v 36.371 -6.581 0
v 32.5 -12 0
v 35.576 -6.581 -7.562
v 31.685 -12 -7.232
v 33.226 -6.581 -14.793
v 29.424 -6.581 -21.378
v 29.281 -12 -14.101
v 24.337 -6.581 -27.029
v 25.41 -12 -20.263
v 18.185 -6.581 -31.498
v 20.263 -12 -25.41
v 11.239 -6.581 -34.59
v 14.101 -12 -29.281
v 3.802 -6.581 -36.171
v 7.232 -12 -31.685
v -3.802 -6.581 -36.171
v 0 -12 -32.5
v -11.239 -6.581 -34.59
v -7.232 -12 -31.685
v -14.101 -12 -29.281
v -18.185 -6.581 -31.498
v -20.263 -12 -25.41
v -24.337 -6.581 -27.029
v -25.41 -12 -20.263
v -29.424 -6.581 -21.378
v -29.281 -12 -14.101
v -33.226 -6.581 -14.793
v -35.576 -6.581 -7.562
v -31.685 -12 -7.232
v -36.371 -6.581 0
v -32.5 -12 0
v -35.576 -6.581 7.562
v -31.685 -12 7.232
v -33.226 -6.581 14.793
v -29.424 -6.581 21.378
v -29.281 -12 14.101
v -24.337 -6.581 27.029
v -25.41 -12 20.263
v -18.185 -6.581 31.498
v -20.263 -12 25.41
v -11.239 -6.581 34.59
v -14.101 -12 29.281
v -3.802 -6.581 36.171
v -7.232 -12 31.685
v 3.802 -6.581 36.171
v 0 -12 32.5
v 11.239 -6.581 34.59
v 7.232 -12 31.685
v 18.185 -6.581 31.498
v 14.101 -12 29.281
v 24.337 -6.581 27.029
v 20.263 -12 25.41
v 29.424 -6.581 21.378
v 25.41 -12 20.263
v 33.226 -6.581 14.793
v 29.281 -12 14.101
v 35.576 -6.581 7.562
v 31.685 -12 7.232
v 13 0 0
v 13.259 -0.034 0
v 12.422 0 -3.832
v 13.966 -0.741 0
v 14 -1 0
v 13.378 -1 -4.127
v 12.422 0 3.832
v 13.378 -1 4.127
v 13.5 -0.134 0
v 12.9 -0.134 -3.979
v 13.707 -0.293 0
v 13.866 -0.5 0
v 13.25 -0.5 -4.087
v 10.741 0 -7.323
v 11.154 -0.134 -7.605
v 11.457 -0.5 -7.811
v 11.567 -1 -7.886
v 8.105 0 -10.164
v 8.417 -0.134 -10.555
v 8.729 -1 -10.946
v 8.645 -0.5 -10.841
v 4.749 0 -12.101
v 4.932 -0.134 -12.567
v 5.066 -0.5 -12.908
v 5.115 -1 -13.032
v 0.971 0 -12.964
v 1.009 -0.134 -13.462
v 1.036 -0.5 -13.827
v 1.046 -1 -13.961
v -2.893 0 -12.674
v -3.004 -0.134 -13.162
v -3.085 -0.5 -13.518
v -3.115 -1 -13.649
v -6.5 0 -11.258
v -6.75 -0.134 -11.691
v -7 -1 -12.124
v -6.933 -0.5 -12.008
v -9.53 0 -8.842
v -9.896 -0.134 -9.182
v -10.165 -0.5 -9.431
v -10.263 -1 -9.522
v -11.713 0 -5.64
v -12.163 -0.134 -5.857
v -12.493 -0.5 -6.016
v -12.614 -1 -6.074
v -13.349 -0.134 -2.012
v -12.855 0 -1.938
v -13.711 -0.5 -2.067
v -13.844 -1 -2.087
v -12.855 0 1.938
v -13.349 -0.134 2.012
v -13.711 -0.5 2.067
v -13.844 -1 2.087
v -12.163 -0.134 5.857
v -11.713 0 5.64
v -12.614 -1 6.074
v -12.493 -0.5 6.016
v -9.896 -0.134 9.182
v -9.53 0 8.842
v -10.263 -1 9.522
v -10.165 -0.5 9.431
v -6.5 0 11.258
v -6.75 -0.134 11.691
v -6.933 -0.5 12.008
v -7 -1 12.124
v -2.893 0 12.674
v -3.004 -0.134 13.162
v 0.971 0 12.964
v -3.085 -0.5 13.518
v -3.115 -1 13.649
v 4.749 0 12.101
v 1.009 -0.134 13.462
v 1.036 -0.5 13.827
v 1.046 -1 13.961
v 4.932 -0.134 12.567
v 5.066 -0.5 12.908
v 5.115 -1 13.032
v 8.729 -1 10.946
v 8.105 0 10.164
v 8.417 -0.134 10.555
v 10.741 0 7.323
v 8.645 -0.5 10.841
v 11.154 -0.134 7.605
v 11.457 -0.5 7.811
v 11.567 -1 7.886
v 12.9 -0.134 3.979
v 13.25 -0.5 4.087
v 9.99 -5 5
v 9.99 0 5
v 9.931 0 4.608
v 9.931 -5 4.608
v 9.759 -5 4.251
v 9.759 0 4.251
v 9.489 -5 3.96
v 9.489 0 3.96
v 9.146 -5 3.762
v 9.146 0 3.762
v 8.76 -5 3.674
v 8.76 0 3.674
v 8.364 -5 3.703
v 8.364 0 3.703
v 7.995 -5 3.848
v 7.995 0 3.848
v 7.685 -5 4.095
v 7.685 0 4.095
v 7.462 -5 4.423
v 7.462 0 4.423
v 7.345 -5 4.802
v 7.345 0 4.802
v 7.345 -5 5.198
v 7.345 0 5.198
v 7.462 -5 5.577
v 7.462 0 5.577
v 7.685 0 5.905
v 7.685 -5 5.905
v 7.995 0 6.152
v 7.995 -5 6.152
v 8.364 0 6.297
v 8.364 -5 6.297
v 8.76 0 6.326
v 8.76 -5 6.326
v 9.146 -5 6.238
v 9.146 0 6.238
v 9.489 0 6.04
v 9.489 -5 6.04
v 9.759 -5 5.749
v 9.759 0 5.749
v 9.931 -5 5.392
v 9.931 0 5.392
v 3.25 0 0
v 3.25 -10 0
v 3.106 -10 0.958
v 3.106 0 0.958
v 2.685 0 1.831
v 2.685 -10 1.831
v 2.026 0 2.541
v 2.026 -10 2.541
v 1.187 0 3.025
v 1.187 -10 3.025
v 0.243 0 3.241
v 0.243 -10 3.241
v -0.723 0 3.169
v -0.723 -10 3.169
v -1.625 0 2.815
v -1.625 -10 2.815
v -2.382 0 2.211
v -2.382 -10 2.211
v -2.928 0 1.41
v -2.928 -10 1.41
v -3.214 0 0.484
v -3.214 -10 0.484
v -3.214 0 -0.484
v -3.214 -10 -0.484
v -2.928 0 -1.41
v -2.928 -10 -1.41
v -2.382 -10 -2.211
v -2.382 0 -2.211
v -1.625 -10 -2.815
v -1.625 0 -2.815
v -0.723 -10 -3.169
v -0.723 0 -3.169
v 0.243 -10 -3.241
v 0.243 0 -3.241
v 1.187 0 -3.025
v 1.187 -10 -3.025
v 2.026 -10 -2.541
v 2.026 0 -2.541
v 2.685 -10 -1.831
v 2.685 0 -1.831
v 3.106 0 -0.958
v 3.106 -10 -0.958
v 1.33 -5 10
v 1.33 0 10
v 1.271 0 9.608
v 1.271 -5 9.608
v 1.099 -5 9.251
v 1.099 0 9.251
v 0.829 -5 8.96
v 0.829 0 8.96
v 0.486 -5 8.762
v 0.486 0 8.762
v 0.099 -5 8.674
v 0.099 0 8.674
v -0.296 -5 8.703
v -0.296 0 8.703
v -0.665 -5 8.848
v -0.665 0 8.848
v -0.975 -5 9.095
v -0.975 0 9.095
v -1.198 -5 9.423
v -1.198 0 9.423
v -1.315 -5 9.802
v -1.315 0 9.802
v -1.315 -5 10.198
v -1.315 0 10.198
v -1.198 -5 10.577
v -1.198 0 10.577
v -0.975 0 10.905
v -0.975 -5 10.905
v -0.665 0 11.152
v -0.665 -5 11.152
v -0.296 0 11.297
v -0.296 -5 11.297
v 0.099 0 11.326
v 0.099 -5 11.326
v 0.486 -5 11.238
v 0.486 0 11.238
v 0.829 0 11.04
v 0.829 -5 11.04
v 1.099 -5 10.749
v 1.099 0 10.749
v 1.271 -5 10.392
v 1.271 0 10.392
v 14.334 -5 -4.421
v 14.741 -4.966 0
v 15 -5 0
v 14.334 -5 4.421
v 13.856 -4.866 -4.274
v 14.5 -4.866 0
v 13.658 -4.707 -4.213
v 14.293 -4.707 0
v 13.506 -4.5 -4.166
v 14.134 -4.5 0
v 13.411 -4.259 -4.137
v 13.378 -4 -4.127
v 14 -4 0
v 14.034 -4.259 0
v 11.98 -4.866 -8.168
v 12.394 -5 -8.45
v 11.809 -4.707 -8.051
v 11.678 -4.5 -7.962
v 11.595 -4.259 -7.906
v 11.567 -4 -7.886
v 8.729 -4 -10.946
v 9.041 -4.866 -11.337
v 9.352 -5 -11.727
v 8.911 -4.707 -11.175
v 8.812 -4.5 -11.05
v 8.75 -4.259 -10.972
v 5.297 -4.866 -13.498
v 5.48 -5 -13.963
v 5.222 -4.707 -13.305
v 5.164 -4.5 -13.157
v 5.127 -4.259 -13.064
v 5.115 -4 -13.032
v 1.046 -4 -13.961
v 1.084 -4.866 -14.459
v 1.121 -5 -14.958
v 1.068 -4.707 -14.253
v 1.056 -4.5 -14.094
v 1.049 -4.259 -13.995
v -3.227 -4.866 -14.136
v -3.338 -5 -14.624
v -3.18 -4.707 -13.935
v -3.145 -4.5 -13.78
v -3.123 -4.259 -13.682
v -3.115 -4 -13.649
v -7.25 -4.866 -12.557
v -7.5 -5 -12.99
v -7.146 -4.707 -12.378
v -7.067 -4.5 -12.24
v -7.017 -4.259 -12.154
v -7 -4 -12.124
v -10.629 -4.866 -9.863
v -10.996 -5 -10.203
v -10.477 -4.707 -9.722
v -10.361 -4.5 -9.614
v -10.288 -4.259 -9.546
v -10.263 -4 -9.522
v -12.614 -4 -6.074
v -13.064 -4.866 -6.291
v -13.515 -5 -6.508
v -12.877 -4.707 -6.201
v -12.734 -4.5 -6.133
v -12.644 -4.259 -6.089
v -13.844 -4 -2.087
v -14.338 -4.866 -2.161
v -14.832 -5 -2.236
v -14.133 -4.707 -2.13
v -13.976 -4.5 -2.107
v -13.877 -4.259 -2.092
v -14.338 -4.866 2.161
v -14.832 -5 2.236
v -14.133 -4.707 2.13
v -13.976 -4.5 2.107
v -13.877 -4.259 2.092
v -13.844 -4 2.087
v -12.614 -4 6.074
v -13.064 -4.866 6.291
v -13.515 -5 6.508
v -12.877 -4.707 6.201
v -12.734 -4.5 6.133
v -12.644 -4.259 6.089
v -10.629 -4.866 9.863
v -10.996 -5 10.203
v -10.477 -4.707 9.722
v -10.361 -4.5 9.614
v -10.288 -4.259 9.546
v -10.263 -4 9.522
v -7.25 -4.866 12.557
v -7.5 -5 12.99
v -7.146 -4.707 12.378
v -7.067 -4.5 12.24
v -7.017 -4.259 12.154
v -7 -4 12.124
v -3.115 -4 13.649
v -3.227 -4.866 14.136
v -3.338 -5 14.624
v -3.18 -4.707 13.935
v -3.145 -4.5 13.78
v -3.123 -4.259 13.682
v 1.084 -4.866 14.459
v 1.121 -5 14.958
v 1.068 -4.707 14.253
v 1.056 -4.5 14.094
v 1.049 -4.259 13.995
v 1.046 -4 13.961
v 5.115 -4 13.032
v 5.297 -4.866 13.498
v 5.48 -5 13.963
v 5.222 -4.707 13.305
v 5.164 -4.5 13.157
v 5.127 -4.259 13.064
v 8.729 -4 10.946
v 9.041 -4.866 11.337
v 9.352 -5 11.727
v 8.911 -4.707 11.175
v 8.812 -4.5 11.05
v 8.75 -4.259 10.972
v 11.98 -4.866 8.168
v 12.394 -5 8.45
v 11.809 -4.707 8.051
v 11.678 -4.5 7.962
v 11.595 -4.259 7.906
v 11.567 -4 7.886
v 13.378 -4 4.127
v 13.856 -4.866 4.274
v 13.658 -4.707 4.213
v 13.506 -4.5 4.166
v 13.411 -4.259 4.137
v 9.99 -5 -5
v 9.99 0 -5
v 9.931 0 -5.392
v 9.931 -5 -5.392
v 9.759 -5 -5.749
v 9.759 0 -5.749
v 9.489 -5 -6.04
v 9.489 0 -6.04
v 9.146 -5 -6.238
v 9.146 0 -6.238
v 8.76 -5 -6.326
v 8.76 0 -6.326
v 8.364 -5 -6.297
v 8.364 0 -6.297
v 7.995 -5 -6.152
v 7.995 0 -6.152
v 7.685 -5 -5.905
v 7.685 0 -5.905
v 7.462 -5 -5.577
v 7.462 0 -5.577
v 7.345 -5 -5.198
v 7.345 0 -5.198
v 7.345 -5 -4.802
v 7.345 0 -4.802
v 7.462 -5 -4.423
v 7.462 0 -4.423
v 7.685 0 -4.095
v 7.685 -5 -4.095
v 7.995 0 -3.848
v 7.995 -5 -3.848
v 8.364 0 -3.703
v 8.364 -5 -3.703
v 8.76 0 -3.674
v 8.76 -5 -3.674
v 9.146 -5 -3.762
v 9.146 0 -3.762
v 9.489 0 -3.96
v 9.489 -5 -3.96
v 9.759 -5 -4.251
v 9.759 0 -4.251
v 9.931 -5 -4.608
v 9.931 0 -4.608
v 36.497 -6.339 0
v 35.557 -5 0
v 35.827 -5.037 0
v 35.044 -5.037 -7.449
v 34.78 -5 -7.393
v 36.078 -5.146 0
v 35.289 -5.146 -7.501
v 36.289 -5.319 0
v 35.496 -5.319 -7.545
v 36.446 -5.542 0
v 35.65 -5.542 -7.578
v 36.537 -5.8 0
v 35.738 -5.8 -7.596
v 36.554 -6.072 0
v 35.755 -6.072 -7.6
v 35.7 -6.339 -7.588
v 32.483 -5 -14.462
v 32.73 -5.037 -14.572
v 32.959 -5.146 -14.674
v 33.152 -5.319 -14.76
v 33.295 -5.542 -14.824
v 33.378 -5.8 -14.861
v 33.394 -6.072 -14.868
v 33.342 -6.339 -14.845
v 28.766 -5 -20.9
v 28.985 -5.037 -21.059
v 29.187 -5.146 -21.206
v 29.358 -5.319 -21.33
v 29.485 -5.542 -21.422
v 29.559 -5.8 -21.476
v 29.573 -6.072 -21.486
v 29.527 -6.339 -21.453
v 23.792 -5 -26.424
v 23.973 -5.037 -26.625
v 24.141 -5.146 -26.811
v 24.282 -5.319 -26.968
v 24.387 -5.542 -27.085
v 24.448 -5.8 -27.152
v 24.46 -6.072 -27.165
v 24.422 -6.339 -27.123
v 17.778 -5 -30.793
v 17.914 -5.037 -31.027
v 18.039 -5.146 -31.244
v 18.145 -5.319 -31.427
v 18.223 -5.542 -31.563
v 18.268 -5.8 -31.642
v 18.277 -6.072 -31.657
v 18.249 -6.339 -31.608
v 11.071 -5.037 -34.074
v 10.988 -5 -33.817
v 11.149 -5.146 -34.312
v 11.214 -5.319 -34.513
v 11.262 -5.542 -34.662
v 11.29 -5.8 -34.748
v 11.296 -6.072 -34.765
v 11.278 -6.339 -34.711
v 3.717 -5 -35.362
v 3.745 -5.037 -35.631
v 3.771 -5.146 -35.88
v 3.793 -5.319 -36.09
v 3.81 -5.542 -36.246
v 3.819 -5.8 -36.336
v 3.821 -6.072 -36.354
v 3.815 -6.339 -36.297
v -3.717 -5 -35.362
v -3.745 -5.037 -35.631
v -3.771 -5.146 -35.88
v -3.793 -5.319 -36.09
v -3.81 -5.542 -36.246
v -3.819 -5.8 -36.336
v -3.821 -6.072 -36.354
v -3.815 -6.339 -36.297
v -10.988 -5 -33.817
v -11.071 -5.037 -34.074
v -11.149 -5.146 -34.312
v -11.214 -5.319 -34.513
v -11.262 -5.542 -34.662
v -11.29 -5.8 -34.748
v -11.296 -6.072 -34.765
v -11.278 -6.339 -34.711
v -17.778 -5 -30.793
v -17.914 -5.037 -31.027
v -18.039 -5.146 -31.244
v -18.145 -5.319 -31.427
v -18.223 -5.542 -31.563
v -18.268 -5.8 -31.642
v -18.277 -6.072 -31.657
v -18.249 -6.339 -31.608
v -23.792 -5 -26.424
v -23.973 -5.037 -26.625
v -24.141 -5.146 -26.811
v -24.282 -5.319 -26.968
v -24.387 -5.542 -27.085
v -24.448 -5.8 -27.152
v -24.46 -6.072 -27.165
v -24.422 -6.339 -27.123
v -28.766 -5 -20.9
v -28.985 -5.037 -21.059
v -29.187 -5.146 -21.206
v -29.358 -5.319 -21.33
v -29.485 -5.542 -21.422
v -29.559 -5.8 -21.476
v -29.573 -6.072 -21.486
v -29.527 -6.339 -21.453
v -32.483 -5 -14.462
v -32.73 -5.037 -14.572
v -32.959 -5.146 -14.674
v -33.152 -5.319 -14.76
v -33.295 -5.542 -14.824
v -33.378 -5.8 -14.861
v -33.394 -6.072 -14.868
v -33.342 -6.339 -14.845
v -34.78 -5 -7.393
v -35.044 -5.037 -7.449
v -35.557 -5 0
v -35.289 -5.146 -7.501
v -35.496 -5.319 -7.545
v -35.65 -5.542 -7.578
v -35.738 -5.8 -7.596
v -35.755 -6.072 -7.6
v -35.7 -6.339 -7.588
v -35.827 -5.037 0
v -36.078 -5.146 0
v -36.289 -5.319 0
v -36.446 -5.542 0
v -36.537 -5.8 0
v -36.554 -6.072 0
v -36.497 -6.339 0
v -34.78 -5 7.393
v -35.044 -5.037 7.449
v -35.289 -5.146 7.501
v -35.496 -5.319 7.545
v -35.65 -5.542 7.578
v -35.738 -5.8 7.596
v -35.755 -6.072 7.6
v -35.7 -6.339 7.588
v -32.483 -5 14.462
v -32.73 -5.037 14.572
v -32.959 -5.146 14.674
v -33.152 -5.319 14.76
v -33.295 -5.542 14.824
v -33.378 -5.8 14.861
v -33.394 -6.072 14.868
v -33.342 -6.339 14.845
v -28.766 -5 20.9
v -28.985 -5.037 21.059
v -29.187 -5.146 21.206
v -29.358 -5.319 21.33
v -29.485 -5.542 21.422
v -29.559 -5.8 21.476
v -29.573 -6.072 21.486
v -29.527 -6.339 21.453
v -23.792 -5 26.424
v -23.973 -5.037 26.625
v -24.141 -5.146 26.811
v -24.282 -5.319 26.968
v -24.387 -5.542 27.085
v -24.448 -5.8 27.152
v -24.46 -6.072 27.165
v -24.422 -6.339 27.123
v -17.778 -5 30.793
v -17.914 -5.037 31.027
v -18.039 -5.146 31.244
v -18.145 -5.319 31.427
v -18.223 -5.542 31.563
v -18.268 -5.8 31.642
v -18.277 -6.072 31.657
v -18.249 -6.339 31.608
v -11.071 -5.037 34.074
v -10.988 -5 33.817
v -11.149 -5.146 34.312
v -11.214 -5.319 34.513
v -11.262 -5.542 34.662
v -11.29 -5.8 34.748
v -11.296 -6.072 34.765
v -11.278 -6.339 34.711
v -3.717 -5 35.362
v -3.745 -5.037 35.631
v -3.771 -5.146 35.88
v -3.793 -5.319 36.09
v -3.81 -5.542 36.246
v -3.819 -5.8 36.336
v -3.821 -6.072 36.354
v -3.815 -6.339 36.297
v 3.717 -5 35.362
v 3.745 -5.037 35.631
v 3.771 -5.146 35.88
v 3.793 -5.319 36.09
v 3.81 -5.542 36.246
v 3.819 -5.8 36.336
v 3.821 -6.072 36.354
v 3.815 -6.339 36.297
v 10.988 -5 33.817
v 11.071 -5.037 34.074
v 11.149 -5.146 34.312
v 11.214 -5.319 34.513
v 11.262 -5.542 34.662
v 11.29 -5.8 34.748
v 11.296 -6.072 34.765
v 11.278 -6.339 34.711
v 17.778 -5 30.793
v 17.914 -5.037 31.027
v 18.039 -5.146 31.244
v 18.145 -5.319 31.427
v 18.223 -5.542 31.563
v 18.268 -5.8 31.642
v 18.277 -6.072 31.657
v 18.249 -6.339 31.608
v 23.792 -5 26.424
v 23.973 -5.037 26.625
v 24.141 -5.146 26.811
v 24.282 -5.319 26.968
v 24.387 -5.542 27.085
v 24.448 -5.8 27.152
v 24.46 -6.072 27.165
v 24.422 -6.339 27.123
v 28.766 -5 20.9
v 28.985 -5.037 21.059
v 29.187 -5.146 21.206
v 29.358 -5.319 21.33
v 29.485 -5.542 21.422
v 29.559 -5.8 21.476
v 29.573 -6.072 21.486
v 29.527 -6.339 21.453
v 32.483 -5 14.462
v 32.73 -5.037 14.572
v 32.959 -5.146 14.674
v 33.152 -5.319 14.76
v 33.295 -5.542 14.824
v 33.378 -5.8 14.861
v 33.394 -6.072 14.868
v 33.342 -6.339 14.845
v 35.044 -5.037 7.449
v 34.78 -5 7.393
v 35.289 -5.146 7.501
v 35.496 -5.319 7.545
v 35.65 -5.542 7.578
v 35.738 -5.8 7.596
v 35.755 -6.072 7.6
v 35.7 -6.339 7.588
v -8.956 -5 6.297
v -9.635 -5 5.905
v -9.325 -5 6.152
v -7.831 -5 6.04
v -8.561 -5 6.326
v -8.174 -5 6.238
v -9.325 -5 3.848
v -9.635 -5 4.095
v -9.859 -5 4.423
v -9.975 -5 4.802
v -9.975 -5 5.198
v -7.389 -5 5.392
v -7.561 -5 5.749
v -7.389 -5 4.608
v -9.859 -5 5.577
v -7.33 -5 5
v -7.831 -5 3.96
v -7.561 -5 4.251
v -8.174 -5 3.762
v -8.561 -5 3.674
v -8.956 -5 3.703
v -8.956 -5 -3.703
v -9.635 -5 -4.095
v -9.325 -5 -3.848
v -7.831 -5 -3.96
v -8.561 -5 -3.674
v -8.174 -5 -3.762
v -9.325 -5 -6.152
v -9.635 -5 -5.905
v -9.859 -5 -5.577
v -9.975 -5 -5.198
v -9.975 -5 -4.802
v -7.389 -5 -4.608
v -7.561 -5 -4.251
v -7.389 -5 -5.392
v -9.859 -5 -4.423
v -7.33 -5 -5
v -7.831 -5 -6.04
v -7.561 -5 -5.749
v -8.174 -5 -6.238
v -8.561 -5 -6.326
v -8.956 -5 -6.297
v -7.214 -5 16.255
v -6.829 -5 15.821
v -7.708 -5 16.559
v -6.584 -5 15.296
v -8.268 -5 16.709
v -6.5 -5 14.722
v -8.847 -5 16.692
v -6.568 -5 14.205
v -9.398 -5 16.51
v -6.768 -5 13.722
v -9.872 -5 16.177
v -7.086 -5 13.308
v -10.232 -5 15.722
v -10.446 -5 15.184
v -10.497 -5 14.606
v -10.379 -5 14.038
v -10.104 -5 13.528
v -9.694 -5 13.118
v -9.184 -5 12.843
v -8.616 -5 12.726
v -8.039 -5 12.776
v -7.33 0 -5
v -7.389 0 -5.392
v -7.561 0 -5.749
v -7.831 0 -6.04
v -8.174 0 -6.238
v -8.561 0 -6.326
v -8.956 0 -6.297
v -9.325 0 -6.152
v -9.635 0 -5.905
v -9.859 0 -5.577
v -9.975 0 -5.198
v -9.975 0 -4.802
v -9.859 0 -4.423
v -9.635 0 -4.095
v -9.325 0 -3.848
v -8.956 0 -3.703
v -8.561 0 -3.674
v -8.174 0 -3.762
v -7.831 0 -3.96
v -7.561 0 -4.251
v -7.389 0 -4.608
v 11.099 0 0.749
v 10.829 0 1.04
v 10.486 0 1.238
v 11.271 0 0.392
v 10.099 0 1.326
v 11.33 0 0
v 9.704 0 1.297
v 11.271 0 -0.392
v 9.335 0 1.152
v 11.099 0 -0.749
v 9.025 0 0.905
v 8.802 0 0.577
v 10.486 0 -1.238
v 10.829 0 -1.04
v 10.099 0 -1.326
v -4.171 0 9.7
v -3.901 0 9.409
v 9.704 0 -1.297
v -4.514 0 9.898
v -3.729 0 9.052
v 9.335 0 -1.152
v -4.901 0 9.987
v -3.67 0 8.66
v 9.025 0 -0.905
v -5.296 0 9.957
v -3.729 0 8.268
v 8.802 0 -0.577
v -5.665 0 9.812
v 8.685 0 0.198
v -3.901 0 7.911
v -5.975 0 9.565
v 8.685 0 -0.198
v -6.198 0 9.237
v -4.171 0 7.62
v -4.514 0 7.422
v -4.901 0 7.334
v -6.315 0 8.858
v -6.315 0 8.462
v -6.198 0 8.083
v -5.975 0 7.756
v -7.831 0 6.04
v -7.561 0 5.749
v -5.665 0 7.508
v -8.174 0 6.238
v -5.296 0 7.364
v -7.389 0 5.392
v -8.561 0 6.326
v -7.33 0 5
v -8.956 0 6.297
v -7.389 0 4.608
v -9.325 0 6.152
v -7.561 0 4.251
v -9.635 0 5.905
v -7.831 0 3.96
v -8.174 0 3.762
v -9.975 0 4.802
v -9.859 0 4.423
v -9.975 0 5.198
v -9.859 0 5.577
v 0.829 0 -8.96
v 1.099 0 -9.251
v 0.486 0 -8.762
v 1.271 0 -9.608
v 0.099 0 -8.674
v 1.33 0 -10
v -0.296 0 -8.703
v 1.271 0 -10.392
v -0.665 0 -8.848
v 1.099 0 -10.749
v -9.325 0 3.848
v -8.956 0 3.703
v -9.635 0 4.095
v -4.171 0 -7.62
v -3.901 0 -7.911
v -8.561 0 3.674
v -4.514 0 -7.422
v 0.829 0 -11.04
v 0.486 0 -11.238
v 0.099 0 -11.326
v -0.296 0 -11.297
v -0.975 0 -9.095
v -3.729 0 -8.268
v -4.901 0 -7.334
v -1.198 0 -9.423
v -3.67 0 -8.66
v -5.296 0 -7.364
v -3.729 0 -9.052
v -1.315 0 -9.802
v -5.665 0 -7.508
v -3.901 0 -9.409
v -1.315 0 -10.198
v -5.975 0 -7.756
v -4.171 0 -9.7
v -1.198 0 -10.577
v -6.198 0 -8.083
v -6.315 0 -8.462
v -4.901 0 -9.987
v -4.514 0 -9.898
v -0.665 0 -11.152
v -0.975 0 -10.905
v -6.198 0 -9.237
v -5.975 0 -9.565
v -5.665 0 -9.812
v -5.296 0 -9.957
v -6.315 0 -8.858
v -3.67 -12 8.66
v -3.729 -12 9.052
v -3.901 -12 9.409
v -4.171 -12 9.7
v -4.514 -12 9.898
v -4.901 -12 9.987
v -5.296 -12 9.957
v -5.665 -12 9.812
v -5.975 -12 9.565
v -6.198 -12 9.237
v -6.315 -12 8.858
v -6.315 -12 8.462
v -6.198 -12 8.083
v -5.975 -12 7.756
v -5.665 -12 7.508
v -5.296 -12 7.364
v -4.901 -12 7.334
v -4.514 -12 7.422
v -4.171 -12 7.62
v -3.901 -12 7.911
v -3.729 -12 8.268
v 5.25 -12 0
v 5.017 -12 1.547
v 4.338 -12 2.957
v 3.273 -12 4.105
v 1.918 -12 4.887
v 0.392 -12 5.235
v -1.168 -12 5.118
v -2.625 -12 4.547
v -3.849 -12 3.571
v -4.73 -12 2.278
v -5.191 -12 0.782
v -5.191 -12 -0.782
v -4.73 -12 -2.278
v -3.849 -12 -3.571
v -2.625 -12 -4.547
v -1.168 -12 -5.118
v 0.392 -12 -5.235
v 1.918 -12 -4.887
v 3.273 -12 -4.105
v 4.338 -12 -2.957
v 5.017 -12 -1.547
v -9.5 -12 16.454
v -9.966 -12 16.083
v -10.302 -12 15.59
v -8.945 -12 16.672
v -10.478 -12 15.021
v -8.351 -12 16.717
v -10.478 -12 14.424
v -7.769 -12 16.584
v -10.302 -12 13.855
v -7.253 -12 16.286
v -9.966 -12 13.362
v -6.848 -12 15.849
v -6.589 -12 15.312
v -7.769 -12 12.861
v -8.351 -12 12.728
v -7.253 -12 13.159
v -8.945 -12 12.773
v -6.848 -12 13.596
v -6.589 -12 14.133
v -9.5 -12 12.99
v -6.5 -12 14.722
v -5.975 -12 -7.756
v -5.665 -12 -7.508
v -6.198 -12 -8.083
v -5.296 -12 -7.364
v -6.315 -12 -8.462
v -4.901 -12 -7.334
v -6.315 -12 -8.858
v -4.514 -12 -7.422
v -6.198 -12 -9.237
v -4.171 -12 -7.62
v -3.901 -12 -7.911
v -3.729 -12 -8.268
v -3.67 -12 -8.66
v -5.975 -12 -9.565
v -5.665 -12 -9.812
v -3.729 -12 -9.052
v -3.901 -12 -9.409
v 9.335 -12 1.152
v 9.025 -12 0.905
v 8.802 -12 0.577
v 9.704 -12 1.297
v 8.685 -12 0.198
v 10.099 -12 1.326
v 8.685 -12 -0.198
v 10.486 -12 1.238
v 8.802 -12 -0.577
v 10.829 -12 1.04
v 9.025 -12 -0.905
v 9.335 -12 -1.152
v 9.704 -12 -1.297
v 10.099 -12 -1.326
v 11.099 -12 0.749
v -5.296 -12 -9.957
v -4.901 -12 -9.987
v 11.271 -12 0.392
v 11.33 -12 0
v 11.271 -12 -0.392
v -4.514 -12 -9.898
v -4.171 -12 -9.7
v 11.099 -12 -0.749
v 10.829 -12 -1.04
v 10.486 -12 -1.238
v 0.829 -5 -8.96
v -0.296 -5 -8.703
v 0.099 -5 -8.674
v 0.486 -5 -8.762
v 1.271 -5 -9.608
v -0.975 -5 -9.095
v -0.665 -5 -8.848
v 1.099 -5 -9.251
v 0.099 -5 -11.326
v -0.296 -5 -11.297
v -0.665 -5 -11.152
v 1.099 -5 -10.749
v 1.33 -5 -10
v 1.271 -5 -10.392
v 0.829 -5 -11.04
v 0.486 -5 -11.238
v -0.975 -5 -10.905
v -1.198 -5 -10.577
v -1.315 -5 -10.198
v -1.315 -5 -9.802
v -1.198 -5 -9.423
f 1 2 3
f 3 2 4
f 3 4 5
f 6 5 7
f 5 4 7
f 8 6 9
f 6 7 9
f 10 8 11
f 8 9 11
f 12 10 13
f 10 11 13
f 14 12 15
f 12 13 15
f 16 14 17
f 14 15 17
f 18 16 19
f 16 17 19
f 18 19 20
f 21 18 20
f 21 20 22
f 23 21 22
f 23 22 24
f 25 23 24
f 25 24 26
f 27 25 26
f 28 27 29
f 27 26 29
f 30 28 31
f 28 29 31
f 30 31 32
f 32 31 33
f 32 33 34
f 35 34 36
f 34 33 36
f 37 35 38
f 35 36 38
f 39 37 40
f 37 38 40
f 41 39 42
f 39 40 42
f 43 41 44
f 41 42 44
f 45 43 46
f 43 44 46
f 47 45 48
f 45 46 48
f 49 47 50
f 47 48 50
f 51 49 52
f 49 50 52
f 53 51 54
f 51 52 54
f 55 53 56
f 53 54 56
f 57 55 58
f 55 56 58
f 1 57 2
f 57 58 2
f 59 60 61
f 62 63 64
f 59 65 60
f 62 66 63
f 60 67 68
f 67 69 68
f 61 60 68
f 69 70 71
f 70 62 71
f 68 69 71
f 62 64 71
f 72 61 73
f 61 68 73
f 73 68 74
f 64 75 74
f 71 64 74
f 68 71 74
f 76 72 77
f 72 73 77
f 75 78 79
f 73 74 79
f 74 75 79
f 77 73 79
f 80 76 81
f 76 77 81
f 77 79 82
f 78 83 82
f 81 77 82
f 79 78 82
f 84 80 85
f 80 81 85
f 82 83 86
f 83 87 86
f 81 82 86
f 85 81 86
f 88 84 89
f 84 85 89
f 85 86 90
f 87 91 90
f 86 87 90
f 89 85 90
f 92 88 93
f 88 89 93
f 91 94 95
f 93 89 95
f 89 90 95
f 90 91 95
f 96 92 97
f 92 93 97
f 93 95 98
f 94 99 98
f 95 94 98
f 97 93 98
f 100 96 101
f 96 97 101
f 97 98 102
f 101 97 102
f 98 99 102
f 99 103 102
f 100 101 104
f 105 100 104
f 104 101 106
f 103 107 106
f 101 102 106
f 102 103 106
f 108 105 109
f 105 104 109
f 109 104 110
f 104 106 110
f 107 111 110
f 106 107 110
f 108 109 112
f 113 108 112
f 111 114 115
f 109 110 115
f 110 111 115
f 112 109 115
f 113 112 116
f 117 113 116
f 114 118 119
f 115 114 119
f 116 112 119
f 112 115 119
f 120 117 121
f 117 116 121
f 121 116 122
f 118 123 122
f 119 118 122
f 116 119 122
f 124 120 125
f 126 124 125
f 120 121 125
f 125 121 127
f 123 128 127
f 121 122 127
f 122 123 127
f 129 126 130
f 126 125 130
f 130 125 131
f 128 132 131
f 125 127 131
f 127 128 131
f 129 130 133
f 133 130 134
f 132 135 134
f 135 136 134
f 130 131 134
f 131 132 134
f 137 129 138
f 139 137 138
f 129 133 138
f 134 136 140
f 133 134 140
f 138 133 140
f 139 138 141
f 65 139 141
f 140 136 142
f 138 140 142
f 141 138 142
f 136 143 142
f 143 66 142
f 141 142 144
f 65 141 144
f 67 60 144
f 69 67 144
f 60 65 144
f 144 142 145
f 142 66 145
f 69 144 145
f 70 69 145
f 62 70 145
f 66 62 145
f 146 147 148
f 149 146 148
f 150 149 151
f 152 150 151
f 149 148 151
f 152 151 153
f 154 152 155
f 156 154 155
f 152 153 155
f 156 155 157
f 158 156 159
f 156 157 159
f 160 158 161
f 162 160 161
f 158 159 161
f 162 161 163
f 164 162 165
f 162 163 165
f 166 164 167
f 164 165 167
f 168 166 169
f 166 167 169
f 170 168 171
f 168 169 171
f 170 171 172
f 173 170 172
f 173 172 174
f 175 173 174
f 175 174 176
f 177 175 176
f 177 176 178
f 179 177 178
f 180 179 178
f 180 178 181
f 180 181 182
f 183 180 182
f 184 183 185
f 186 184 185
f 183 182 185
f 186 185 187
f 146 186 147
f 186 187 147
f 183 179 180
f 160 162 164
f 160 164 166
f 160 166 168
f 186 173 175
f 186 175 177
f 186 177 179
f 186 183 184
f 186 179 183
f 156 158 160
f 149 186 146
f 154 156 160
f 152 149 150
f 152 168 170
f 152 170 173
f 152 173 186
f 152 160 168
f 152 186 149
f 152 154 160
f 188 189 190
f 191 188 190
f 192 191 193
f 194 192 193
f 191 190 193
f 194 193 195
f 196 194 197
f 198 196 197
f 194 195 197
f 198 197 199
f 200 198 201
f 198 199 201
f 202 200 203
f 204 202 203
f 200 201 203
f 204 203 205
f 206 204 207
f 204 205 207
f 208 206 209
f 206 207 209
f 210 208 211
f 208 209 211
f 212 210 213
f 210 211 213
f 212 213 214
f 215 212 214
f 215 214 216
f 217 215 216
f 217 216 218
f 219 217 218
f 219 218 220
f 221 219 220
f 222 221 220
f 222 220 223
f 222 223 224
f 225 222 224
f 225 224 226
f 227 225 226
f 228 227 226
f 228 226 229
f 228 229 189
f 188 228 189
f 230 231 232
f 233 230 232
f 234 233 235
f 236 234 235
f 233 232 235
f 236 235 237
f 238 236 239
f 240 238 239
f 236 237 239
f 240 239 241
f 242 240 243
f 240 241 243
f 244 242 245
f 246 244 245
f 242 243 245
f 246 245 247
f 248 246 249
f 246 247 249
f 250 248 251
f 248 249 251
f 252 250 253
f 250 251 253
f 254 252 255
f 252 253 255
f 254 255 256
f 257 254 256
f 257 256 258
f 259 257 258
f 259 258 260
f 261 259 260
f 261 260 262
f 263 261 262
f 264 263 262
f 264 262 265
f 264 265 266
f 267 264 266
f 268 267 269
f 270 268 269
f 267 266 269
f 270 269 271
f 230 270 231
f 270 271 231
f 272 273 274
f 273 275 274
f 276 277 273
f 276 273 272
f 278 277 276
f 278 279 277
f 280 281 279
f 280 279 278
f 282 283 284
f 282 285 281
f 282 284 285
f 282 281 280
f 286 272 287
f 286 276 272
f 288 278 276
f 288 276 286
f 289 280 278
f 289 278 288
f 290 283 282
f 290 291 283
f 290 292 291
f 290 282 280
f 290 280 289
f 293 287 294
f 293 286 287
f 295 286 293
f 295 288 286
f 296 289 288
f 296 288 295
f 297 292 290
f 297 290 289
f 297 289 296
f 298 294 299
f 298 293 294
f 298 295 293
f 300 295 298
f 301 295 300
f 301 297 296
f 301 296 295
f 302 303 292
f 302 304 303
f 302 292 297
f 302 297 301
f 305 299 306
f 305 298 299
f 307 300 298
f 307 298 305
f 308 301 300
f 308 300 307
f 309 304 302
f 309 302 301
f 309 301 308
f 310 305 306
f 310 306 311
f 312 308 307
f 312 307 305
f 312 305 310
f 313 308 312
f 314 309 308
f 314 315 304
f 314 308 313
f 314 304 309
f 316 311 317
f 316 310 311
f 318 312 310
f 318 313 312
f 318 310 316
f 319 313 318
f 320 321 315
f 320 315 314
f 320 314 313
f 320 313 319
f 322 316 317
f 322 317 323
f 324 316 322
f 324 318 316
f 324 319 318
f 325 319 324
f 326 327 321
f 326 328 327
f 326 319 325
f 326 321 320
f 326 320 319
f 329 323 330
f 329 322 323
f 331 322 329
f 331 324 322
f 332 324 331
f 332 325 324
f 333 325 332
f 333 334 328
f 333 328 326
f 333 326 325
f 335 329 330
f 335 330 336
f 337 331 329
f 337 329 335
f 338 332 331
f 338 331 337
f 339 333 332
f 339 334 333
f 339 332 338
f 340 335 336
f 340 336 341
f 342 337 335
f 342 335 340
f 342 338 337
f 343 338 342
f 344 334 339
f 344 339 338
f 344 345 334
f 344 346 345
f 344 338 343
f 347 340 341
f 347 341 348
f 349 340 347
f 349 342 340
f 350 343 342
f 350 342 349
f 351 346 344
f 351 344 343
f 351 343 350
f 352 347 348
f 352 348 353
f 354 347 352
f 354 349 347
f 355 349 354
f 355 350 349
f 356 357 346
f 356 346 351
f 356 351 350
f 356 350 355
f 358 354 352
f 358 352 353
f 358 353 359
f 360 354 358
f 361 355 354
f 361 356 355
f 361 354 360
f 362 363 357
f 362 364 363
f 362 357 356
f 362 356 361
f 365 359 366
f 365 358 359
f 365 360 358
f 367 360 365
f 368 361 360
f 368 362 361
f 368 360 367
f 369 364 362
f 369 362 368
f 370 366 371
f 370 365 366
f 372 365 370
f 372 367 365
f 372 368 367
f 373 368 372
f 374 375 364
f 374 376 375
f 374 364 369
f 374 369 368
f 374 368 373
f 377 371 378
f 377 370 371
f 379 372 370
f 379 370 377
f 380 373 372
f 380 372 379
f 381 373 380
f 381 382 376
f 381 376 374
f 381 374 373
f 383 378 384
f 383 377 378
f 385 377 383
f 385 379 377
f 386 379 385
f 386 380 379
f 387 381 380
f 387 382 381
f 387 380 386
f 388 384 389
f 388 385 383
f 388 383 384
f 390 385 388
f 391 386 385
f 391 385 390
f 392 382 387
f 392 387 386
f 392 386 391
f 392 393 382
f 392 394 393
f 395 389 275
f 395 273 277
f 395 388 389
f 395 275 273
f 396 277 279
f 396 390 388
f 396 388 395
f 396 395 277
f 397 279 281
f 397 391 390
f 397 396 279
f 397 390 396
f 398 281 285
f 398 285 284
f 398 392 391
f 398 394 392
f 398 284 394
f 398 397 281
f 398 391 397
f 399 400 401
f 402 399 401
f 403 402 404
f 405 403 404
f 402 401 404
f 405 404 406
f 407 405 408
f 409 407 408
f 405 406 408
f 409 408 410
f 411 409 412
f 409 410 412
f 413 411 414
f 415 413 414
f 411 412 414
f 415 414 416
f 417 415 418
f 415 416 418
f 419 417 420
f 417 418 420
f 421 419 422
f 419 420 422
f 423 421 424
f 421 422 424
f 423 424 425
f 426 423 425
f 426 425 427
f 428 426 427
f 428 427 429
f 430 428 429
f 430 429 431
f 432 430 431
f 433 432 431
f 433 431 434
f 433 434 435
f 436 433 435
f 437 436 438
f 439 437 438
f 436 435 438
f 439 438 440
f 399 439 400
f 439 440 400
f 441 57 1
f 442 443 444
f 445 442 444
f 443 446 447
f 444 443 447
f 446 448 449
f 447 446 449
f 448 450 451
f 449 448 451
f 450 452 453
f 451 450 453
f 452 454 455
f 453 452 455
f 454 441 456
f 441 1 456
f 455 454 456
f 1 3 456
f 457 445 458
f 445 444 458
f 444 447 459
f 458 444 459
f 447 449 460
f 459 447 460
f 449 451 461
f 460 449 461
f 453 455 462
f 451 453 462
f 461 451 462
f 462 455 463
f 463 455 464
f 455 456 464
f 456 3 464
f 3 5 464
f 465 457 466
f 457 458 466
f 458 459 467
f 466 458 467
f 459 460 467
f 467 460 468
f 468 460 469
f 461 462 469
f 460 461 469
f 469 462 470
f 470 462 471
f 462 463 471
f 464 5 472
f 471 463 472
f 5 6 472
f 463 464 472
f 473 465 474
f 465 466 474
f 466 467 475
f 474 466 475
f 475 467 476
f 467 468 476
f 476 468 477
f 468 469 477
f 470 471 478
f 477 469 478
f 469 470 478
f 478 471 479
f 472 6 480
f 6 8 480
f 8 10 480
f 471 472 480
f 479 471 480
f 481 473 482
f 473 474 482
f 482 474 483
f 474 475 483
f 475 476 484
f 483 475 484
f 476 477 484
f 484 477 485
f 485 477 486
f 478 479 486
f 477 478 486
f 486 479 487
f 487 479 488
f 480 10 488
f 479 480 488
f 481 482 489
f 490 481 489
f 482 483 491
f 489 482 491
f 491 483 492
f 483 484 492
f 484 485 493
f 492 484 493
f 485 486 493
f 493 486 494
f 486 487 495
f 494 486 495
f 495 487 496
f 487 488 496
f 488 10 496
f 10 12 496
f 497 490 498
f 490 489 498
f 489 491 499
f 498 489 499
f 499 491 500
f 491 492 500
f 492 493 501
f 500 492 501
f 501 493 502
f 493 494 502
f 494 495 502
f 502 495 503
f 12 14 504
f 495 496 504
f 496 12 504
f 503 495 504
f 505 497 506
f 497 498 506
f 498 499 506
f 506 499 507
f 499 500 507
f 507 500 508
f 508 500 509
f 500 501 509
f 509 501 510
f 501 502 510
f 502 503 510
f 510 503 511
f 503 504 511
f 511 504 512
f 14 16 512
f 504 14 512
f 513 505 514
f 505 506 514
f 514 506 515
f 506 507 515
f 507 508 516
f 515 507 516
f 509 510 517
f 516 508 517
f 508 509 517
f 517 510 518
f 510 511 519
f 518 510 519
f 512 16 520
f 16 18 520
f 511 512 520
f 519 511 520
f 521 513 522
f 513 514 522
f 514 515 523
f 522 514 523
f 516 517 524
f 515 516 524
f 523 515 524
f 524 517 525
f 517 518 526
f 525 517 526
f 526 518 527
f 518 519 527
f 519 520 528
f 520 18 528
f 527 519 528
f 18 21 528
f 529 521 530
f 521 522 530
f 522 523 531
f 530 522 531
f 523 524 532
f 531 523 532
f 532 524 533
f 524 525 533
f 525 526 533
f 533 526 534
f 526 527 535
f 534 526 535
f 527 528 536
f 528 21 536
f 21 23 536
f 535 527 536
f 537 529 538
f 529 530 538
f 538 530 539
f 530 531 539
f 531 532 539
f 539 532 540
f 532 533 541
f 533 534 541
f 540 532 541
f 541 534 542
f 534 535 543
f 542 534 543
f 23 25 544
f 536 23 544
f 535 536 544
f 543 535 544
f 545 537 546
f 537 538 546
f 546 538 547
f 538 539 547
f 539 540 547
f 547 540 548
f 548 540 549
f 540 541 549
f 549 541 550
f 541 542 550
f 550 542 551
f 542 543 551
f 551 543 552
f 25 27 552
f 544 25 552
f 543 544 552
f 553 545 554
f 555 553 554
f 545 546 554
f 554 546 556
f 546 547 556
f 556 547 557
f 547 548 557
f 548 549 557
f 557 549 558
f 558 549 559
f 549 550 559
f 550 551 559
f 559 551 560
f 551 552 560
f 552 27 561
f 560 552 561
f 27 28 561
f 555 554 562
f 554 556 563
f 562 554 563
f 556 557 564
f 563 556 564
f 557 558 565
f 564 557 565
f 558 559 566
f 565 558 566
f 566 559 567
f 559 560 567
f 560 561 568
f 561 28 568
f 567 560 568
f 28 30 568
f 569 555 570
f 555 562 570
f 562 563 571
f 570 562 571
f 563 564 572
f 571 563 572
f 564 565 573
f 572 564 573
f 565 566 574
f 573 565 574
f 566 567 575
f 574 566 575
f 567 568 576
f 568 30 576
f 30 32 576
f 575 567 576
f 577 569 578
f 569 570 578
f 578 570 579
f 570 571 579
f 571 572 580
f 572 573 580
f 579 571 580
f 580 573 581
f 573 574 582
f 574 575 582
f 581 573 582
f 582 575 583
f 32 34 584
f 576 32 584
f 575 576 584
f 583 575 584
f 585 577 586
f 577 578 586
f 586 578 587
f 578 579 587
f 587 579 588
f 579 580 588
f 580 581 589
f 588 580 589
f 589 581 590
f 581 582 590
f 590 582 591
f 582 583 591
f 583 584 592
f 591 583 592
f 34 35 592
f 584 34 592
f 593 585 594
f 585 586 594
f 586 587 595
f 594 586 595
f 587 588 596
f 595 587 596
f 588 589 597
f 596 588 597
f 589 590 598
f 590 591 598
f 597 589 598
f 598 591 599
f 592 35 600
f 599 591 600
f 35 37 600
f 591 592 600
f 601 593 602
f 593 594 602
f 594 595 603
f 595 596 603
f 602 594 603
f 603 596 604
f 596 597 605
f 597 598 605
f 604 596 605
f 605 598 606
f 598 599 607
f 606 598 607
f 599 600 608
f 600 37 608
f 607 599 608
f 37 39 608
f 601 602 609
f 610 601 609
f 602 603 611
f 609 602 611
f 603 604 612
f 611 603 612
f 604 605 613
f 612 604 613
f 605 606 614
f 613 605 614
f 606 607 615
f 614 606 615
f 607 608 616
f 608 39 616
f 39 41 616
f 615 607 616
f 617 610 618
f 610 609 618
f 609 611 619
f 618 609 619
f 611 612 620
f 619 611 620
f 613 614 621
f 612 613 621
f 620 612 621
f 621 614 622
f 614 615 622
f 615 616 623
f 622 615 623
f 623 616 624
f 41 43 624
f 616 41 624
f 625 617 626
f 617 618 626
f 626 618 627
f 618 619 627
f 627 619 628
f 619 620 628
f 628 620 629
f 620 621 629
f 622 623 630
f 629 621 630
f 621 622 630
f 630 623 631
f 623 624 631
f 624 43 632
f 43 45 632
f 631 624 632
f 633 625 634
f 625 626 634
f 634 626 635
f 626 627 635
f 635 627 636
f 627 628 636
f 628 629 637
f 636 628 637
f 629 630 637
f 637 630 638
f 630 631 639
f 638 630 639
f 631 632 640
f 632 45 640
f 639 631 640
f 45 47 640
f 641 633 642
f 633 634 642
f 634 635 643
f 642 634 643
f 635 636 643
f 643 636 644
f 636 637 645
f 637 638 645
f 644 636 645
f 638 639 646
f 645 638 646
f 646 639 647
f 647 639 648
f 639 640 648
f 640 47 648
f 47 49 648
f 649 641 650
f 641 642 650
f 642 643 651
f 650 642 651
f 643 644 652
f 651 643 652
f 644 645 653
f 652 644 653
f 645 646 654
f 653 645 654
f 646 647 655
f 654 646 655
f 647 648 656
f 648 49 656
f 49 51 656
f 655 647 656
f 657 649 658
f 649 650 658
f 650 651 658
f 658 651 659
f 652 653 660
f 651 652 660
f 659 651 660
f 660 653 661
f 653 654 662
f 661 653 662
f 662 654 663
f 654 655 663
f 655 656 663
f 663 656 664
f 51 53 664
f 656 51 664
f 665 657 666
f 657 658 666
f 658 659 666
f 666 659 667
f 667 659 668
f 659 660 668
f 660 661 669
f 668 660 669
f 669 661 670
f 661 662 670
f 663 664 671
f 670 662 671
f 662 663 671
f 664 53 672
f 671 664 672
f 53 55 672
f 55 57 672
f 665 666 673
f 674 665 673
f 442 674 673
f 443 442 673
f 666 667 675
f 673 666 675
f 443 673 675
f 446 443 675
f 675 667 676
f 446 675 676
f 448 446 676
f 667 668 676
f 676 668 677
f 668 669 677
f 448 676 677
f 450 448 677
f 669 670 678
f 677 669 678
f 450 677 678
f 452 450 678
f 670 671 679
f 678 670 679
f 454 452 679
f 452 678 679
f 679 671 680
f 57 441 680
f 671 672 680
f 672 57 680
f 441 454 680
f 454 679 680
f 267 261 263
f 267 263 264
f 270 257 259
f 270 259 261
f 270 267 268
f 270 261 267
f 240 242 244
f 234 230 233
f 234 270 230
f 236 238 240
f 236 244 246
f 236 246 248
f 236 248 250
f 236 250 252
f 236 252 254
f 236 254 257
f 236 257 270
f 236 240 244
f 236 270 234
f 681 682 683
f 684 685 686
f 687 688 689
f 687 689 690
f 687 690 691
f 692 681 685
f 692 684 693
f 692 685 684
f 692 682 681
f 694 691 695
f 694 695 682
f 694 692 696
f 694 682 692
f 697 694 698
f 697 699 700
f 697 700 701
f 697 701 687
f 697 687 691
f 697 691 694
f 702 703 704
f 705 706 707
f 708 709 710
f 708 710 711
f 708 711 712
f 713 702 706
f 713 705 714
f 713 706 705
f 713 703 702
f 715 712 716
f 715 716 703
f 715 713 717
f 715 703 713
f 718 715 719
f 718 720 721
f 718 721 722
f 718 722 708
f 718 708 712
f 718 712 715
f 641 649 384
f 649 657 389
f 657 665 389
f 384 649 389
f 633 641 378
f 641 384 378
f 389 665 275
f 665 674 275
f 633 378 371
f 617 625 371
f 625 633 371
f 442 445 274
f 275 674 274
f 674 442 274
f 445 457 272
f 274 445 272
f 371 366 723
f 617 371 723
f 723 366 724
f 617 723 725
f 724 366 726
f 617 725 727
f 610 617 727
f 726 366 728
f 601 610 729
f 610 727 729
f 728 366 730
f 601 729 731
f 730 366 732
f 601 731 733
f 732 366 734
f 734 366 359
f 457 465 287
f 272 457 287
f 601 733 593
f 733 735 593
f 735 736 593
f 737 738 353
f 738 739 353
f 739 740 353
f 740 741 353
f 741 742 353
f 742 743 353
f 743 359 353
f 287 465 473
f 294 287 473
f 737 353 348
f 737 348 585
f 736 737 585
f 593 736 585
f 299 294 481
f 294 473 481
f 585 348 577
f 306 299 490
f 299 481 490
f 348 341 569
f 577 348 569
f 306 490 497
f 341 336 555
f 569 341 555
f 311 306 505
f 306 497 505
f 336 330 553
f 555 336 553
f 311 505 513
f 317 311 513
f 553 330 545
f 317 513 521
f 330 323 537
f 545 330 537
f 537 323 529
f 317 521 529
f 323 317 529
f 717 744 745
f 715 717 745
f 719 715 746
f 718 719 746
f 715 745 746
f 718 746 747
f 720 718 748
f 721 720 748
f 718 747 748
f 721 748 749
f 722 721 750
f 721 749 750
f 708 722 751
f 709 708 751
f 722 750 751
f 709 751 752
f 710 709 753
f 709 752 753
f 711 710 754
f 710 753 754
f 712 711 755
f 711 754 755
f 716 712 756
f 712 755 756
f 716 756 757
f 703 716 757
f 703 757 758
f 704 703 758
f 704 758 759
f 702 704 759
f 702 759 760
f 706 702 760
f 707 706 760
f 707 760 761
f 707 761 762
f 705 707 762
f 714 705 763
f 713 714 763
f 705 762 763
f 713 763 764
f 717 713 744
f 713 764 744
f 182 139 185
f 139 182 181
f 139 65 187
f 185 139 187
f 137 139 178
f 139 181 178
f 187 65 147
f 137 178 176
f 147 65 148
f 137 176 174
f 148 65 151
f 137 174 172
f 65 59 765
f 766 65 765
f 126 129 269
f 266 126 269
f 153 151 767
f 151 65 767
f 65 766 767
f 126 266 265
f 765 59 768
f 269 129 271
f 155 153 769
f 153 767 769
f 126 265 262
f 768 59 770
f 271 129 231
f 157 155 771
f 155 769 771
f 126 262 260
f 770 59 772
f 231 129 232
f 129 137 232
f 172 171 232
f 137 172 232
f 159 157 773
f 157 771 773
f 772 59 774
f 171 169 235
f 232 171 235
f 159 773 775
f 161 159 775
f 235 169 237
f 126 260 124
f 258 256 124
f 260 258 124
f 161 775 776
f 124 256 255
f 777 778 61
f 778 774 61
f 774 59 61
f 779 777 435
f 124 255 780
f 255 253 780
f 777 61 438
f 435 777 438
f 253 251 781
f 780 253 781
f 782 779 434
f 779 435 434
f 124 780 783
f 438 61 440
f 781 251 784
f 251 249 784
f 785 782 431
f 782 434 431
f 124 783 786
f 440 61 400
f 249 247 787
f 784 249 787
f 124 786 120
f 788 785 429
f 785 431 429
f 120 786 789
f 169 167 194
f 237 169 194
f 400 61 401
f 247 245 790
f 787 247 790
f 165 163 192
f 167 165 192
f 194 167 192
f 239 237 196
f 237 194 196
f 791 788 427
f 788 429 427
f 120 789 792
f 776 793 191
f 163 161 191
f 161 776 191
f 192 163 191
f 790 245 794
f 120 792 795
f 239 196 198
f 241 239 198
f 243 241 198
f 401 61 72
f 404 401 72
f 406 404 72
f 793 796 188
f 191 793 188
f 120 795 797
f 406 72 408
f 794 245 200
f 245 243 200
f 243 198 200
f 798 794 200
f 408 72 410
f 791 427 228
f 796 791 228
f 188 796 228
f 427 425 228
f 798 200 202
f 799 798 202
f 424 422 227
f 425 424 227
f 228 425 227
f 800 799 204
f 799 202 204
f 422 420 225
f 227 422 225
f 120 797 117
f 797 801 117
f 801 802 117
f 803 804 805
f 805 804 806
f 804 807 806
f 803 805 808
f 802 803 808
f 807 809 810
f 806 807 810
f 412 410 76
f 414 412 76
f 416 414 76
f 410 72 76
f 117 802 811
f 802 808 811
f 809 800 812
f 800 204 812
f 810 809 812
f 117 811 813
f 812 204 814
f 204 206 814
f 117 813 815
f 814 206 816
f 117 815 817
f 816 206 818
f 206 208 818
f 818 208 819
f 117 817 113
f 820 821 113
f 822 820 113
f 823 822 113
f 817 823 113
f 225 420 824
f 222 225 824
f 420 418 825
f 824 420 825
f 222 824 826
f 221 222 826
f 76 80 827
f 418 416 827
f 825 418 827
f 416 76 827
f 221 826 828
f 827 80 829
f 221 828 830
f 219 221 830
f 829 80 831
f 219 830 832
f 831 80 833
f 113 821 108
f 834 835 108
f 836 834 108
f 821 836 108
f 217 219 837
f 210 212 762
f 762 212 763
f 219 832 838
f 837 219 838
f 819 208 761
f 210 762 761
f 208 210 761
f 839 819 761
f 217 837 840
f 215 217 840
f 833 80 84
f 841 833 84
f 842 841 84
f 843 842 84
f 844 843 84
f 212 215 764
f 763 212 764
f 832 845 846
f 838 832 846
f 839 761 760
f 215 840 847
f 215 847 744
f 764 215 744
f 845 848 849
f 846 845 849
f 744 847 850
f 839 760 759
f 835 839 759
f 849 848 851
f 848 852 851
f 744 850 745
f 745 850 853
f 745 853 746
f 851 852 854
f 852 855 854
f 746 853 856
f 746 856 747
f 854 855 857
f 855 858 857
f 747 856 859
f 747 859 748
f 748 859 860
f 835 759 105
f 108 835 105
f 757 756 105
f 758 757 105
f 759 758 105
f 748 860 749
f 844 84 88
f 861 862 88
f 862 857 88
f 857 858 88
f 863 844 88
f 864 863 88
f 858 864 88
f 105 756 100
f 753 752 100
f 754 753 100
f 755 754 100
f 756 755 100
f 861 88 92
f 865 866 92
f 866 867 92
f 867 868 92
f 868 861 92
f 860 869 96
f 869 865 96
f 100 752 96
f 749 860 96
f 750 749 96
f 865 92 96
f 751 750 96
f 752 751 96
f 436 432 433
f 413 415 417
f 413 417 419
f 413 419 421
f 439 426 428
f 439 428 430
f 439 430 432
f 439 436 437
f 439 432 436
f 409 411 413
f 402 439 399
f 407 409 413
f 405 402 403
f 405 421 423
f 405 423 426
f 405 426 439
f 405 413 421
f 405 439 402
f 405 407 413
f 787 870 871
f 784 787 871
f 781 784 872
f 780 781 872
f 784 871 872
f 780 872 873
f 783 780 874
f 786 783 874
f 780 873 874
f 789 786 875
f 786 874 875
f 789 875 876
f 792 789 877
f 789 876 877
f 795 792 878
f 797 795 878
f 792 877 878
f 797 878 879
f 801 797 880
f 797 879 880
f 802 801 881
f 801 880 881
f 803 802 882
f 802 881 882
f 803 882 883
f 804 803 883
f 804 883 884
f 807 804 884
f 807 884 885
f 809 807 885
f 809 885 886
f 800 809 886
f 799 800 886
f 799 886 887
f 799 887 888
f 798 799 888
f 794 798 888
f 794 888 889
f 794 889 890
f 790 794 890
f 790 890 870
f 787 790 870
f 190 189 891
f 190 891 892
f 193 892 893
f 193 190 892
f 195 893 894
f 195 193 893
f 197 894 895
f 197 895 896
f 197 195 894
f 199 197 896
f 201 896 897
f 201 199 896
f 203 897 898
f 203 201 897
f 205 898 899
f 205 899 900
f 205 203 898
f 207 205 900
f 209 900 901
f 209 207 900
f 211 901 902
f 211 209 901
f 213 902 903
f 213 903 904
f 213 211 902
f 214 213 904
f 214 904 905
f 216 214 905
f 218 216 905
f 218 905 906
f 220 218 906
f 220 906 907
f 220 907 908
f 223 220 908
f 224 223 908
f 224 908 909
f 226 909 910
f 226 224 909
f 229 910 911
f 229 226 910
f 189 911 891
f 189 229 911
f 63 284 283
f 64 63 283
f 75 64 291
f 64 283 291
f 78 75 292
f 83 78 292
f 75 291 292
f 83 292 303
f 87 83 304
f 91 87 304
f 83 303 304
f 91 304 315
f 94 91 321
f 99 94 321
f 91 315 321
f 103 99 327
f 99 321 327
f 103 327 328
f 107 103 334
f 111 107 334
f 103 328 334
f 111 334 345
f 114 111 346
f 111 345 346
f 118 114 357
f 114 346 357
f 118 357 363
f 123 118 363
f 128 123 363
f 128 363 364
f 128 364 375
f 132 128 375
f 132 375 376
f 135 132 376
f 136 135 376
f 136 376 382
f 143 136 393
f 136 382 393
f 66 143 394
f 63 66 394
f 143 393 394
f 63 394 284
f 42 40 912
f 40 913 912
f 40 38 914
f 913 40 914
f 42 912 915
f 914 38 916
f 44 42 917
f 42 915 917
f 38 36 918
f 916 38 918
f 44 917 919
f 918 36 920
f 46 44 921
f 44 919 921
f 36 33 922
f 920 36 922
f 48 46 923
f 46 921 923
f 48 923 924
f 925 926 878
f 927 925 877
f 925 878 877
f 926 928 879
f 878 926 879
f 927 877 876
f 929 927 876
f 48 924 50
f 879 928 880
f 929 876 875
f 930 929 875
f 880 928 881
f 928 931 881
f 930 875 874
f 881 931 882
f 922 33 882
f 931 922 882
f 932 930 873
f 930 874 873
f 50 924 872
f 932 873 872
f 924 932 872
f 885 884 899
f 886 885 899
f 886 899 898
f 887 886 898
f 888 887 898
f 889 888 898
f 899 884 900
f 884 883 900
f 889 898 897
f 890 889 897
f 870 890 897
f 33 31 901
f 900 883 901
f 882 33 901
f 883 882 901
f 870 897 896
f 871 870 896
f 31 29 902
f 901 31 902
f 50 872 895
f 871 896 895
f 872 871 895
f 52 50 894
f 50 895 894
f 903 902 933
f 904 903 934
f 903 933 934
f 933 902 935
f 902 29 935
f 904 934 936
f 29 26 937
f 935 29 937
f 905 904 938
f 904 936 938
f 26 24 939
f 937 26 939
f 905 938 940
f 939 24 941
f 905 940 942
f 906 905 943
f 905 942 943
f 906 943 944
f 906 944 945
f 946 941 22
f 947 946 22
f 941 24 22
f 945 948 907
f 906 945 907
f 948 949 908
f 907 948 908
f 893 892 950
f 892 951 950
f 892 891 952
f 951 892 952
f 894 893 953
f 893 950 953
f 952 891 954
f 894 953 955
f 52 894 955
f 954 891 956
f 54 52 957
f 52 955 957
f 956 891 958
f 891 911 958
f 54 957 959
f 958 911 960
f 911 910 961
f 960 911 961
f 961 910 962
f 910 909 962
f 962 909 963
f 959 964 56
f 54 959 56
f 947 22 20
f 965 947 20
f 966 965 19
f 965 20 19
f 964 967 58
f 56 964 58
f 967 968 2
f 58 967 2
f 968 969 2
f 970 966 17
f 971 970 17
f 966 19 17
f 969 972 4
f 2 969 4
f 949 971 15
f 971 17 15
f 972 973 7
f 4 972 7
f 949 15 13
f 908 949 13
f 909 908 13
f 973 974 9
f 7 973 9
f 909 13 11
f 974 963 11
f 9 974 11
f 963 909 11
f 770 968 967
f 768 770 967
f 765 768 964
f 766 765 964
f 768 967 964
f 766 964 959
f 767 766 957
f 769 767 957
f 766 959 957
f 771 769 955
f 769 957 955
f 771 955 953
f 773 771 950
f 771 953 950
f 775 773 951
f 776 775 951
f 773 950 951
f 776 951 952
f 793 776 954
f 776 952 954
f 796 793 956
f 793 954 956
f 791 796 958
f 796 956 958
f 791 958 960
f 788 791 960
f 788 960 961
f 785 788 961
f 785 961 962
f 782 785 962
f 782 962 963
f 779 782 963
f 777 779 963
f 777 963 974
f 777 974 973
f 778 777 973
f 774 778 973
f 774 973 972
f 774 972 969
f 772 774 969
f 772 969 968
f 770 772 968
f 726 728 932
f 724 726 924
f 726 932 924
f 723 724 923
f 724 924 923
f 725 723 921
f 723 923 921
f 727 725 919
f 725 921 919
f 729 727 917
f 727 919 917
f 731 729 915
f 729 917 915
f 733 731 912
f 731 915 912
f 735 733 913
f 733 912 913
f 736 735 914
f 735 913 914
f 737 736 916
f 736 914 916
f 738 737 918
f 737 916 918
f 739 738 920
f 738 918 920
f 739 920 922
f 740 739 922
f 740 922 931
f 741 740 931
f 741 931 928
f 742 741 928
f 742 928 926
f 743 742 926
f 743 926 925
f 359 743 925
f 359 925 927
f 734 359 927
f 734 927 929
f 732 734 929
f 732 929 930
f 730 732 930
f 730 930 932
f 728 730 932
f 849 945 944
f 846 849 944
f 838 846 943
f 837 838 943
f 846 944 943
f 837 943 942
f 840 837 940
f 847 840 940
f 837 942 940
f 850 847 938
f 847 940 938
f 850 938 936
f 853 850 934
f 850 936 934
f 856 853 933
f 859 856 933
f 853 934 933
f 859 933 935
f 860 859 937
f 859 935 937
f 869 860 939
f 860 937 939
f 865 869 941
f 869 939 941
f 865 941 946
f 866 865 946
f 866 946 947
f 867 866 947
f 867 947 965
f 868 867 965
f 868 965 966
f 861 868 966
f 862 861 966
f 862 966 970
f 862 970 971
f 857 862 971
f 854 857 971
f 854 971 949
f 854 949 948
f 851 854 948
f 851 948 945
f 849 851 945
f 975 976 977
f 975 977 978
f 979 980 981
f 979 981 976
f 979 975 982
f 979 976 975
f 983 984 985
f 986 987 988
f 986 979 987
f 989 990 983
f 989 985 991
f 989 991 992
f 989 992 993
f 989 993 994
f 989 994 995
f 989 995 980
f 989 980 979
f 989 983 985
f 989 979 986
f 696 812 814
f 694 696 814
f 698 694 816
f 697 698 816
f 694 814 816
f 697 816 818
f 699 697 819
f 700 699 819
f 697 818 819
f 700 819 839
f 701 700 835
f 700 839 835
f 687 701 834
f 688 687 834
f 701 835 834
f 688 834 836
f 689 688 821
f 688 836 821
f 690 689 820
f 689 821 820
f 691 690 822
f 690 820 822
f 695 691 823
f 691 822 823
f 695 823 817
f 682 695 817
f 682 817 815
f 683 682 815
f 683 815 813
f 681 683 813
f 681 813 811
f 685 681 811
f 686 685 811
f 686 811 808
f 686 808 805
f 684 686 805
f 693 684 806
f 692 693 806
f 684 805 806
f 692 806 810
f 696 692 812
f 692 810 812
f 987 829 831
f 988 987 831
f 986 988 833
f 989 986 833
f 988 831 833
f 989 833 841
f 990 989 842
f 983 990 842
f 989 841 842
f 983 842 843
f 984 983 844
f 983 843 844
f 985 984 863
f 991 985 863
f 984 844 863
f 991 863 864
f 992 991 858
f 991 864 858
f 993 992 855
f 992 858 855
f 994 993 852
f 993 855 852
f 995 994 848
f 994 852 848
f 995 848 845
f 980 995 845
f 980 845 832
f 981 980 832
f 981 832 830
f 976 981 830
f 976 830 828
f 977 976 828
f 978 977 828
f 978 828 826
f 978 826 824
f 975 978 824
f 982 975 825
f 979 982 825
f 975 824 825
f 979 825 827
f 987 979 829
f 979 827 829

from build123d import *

# Parameters (mm, degrees)
CONG_1_R                = 1
ENL_V_MAT_EXTRU_1_REACH = 14
ESQUISSE2_R             = 3.25
ESQUISSE2_R_2           = 1.33
ESQUISSE2_R_3           = 2
CHANFREIN1_SIZE         = 2
ESQUISSE3_R             = 1.33
ENL_V_MAT_EXTRU_2_DEPTH = 5


with BuildPart() as part:
    # Esquisse1 → Révolution1 (revolve)
    with BuildSketch(Plane.XY):
        Polygon((14, -5), (37.5, -5), (32.5, -12), (0, -12), (0, 0), (14, 0), align=None)
    revolve(axis=Axis((0, 0, 0), (0, 1, 0)))

    # Congé1
    cong_1_edges = [part.edges().sort_by_distance(p)[0] for p in [
        (-37.5, -5, 0),
        (-14, -5, 0),
        (-14, 0, 0),
    ]]
    fillet(cong_1_edges, radius=CONG_1_R)

    # Esquisse2 → Enlèv. mat.-Extru.1 (cut, up to next)
    with BuildSketch(Plane.XZ.offset(12), mode=Mode.PRIVATE) as enl_v_mat_extru_1_sk1:
        Circle(ESQUISSE2_R)
    enl_v_mat_extru_1_tool1 = extrude(enl_v_mat_extru_1_sk1.sketch, amount=-ENL_V_MAT_EXTRU_1_REACH, mode=Mode.PRIVATE) & part.part
    add(enl_v_mat_extru_1_tool1.solids().sort_by_distance((0, -12, 0))[0], mode=Mode.SUBTRACT)
    # Esquisse2 → Enlèv. mat.-Extru.1 (cut, up to next)
    with BuildSketch(Plane.XZ.offset(12), mode=Mode.PRIVATE) as enl_v_mat_extru_1_sk2:
        with Locations((10, 0)):
            Circle(ESQUISSE2_R_2)
    enl_v_mat_extru_1_tool2 = extrude(enl_v_mat_extru_1_sk2.sketch, amount=-ENL_V_MAT_EXTRU_1_REACH, mode=Mode.PRIVATE) & part.part
    add(enl_v_mat_extru_1_tool2.solids().sort_by_distance((10, -12, 0))[0], mode=Mode.SUBTRACT)
    # Esquisse2 → Enlèv. mat.-Extru.1 (cut, up to next)
    with BuildSketch(Plane.XZ.offset(12), mode=Mode.PRIVATE) as enl_v_mat_extru_1_sk3:
        with Locations((-5, -8.660254038)):
            Circle(ESQUISSE2_R_2)
    enl_v_mat_extru_1_tool3 = extrude(enl_v_mat_extru_1_sk3.sketch, amount=-ENL_V_MAT_EXTRU_1_REACH, mode=Mode.PRIVATE) & part.part
    add(enl_v_mat_extru_1_tool3.solids().sort_by_distance((-5, -12, -8.660254))[0], mode=Mode.SUBTRACT)
    # Esquisse2 → Enlèv. mat.-Extru.1 (cut, up to next)
    with BuildSketch(Plane.XZ.offset(12), mode=Mode.PRIVATE) as enl_v_mat_extru_1_sk4:
        with Locations((-5, 8.660254038)):
            Circle(ESQUISSE2_R_2)
    enl_v_mat_extru_1_tool4 = extrude(enl_v_mat_extru_1_sk4.sketch, amount=-ENL_V_MAT_EXTRU_1_REACH, mode=Mode.PRIVATE) & part.part
    add(enl_v_mat_extru_1_tool4.solids().sort_by_distance((-5, -12, 8.660254))[0], mode=Mode.SUBTRACT)
    # Esquisse2 → Enlèv. mat.-Extru.1 (cut, up to next)
    with BuildSketch(Plane.XZ.offset(12), mode=Mode.PRIVATE) as enl_v_mat_extru_1_sk5:
        with Locations((-8.5, 14.722431864)):
            Circle(ESQUISSE2_R_3)
    enl_v_mat_extru_1_tool5 = extrude(enl_v_mat_extru_1_sk5.sketch, amount=-ENL_V_MAT_EXTRU_1_REACH, mode=Mode.PRIVATE) & part.part
    add(enl_v_mat_extru_1_tool5.solids().sort_by_distance((-8.5, -12, 14.722432))[0], mode=Mode.SUBTRACT)

    # Chanfrein1
    chanfrein1_edges = [part.edges().sort_by_distance(p)[0] for p in [
        (-3.25, -12, 0),
    ]]
    chamfer(chanfrein1_edges, length=CHANFREIN1_SIZE)

    # Esquisse3 → Enlèv. mat.-Extru.2 (cut)
    with BuildSketch(Plane(origin=(0, 0, 0), x_dir=(1, 0, 0), z_dir=(0, 1, 0))):
        with Locations((8.660254038, 5)):
            Circle(ESQUISSE3_R)
        with Locations((8.660254038, -5)):
            Circle(ESQUISSE3_R)
        with Locations((-8.660254038, -5)):
            Circle(ESQUISSE3_R)
        with Locations((0, -10)):
            Circle(ESQUISSE3_R)
        with Locations((0, 10)):
            Circle(ESQUISSE3_R)
        with Locations((-8.660254038, 5)):
            Circle(ESQUISSE3_R)
    extrude(amount=-ENL_V_MAT_EXTRU_2_DEPTH, mode=Mode.SUBTRACT)


solid = part.part
